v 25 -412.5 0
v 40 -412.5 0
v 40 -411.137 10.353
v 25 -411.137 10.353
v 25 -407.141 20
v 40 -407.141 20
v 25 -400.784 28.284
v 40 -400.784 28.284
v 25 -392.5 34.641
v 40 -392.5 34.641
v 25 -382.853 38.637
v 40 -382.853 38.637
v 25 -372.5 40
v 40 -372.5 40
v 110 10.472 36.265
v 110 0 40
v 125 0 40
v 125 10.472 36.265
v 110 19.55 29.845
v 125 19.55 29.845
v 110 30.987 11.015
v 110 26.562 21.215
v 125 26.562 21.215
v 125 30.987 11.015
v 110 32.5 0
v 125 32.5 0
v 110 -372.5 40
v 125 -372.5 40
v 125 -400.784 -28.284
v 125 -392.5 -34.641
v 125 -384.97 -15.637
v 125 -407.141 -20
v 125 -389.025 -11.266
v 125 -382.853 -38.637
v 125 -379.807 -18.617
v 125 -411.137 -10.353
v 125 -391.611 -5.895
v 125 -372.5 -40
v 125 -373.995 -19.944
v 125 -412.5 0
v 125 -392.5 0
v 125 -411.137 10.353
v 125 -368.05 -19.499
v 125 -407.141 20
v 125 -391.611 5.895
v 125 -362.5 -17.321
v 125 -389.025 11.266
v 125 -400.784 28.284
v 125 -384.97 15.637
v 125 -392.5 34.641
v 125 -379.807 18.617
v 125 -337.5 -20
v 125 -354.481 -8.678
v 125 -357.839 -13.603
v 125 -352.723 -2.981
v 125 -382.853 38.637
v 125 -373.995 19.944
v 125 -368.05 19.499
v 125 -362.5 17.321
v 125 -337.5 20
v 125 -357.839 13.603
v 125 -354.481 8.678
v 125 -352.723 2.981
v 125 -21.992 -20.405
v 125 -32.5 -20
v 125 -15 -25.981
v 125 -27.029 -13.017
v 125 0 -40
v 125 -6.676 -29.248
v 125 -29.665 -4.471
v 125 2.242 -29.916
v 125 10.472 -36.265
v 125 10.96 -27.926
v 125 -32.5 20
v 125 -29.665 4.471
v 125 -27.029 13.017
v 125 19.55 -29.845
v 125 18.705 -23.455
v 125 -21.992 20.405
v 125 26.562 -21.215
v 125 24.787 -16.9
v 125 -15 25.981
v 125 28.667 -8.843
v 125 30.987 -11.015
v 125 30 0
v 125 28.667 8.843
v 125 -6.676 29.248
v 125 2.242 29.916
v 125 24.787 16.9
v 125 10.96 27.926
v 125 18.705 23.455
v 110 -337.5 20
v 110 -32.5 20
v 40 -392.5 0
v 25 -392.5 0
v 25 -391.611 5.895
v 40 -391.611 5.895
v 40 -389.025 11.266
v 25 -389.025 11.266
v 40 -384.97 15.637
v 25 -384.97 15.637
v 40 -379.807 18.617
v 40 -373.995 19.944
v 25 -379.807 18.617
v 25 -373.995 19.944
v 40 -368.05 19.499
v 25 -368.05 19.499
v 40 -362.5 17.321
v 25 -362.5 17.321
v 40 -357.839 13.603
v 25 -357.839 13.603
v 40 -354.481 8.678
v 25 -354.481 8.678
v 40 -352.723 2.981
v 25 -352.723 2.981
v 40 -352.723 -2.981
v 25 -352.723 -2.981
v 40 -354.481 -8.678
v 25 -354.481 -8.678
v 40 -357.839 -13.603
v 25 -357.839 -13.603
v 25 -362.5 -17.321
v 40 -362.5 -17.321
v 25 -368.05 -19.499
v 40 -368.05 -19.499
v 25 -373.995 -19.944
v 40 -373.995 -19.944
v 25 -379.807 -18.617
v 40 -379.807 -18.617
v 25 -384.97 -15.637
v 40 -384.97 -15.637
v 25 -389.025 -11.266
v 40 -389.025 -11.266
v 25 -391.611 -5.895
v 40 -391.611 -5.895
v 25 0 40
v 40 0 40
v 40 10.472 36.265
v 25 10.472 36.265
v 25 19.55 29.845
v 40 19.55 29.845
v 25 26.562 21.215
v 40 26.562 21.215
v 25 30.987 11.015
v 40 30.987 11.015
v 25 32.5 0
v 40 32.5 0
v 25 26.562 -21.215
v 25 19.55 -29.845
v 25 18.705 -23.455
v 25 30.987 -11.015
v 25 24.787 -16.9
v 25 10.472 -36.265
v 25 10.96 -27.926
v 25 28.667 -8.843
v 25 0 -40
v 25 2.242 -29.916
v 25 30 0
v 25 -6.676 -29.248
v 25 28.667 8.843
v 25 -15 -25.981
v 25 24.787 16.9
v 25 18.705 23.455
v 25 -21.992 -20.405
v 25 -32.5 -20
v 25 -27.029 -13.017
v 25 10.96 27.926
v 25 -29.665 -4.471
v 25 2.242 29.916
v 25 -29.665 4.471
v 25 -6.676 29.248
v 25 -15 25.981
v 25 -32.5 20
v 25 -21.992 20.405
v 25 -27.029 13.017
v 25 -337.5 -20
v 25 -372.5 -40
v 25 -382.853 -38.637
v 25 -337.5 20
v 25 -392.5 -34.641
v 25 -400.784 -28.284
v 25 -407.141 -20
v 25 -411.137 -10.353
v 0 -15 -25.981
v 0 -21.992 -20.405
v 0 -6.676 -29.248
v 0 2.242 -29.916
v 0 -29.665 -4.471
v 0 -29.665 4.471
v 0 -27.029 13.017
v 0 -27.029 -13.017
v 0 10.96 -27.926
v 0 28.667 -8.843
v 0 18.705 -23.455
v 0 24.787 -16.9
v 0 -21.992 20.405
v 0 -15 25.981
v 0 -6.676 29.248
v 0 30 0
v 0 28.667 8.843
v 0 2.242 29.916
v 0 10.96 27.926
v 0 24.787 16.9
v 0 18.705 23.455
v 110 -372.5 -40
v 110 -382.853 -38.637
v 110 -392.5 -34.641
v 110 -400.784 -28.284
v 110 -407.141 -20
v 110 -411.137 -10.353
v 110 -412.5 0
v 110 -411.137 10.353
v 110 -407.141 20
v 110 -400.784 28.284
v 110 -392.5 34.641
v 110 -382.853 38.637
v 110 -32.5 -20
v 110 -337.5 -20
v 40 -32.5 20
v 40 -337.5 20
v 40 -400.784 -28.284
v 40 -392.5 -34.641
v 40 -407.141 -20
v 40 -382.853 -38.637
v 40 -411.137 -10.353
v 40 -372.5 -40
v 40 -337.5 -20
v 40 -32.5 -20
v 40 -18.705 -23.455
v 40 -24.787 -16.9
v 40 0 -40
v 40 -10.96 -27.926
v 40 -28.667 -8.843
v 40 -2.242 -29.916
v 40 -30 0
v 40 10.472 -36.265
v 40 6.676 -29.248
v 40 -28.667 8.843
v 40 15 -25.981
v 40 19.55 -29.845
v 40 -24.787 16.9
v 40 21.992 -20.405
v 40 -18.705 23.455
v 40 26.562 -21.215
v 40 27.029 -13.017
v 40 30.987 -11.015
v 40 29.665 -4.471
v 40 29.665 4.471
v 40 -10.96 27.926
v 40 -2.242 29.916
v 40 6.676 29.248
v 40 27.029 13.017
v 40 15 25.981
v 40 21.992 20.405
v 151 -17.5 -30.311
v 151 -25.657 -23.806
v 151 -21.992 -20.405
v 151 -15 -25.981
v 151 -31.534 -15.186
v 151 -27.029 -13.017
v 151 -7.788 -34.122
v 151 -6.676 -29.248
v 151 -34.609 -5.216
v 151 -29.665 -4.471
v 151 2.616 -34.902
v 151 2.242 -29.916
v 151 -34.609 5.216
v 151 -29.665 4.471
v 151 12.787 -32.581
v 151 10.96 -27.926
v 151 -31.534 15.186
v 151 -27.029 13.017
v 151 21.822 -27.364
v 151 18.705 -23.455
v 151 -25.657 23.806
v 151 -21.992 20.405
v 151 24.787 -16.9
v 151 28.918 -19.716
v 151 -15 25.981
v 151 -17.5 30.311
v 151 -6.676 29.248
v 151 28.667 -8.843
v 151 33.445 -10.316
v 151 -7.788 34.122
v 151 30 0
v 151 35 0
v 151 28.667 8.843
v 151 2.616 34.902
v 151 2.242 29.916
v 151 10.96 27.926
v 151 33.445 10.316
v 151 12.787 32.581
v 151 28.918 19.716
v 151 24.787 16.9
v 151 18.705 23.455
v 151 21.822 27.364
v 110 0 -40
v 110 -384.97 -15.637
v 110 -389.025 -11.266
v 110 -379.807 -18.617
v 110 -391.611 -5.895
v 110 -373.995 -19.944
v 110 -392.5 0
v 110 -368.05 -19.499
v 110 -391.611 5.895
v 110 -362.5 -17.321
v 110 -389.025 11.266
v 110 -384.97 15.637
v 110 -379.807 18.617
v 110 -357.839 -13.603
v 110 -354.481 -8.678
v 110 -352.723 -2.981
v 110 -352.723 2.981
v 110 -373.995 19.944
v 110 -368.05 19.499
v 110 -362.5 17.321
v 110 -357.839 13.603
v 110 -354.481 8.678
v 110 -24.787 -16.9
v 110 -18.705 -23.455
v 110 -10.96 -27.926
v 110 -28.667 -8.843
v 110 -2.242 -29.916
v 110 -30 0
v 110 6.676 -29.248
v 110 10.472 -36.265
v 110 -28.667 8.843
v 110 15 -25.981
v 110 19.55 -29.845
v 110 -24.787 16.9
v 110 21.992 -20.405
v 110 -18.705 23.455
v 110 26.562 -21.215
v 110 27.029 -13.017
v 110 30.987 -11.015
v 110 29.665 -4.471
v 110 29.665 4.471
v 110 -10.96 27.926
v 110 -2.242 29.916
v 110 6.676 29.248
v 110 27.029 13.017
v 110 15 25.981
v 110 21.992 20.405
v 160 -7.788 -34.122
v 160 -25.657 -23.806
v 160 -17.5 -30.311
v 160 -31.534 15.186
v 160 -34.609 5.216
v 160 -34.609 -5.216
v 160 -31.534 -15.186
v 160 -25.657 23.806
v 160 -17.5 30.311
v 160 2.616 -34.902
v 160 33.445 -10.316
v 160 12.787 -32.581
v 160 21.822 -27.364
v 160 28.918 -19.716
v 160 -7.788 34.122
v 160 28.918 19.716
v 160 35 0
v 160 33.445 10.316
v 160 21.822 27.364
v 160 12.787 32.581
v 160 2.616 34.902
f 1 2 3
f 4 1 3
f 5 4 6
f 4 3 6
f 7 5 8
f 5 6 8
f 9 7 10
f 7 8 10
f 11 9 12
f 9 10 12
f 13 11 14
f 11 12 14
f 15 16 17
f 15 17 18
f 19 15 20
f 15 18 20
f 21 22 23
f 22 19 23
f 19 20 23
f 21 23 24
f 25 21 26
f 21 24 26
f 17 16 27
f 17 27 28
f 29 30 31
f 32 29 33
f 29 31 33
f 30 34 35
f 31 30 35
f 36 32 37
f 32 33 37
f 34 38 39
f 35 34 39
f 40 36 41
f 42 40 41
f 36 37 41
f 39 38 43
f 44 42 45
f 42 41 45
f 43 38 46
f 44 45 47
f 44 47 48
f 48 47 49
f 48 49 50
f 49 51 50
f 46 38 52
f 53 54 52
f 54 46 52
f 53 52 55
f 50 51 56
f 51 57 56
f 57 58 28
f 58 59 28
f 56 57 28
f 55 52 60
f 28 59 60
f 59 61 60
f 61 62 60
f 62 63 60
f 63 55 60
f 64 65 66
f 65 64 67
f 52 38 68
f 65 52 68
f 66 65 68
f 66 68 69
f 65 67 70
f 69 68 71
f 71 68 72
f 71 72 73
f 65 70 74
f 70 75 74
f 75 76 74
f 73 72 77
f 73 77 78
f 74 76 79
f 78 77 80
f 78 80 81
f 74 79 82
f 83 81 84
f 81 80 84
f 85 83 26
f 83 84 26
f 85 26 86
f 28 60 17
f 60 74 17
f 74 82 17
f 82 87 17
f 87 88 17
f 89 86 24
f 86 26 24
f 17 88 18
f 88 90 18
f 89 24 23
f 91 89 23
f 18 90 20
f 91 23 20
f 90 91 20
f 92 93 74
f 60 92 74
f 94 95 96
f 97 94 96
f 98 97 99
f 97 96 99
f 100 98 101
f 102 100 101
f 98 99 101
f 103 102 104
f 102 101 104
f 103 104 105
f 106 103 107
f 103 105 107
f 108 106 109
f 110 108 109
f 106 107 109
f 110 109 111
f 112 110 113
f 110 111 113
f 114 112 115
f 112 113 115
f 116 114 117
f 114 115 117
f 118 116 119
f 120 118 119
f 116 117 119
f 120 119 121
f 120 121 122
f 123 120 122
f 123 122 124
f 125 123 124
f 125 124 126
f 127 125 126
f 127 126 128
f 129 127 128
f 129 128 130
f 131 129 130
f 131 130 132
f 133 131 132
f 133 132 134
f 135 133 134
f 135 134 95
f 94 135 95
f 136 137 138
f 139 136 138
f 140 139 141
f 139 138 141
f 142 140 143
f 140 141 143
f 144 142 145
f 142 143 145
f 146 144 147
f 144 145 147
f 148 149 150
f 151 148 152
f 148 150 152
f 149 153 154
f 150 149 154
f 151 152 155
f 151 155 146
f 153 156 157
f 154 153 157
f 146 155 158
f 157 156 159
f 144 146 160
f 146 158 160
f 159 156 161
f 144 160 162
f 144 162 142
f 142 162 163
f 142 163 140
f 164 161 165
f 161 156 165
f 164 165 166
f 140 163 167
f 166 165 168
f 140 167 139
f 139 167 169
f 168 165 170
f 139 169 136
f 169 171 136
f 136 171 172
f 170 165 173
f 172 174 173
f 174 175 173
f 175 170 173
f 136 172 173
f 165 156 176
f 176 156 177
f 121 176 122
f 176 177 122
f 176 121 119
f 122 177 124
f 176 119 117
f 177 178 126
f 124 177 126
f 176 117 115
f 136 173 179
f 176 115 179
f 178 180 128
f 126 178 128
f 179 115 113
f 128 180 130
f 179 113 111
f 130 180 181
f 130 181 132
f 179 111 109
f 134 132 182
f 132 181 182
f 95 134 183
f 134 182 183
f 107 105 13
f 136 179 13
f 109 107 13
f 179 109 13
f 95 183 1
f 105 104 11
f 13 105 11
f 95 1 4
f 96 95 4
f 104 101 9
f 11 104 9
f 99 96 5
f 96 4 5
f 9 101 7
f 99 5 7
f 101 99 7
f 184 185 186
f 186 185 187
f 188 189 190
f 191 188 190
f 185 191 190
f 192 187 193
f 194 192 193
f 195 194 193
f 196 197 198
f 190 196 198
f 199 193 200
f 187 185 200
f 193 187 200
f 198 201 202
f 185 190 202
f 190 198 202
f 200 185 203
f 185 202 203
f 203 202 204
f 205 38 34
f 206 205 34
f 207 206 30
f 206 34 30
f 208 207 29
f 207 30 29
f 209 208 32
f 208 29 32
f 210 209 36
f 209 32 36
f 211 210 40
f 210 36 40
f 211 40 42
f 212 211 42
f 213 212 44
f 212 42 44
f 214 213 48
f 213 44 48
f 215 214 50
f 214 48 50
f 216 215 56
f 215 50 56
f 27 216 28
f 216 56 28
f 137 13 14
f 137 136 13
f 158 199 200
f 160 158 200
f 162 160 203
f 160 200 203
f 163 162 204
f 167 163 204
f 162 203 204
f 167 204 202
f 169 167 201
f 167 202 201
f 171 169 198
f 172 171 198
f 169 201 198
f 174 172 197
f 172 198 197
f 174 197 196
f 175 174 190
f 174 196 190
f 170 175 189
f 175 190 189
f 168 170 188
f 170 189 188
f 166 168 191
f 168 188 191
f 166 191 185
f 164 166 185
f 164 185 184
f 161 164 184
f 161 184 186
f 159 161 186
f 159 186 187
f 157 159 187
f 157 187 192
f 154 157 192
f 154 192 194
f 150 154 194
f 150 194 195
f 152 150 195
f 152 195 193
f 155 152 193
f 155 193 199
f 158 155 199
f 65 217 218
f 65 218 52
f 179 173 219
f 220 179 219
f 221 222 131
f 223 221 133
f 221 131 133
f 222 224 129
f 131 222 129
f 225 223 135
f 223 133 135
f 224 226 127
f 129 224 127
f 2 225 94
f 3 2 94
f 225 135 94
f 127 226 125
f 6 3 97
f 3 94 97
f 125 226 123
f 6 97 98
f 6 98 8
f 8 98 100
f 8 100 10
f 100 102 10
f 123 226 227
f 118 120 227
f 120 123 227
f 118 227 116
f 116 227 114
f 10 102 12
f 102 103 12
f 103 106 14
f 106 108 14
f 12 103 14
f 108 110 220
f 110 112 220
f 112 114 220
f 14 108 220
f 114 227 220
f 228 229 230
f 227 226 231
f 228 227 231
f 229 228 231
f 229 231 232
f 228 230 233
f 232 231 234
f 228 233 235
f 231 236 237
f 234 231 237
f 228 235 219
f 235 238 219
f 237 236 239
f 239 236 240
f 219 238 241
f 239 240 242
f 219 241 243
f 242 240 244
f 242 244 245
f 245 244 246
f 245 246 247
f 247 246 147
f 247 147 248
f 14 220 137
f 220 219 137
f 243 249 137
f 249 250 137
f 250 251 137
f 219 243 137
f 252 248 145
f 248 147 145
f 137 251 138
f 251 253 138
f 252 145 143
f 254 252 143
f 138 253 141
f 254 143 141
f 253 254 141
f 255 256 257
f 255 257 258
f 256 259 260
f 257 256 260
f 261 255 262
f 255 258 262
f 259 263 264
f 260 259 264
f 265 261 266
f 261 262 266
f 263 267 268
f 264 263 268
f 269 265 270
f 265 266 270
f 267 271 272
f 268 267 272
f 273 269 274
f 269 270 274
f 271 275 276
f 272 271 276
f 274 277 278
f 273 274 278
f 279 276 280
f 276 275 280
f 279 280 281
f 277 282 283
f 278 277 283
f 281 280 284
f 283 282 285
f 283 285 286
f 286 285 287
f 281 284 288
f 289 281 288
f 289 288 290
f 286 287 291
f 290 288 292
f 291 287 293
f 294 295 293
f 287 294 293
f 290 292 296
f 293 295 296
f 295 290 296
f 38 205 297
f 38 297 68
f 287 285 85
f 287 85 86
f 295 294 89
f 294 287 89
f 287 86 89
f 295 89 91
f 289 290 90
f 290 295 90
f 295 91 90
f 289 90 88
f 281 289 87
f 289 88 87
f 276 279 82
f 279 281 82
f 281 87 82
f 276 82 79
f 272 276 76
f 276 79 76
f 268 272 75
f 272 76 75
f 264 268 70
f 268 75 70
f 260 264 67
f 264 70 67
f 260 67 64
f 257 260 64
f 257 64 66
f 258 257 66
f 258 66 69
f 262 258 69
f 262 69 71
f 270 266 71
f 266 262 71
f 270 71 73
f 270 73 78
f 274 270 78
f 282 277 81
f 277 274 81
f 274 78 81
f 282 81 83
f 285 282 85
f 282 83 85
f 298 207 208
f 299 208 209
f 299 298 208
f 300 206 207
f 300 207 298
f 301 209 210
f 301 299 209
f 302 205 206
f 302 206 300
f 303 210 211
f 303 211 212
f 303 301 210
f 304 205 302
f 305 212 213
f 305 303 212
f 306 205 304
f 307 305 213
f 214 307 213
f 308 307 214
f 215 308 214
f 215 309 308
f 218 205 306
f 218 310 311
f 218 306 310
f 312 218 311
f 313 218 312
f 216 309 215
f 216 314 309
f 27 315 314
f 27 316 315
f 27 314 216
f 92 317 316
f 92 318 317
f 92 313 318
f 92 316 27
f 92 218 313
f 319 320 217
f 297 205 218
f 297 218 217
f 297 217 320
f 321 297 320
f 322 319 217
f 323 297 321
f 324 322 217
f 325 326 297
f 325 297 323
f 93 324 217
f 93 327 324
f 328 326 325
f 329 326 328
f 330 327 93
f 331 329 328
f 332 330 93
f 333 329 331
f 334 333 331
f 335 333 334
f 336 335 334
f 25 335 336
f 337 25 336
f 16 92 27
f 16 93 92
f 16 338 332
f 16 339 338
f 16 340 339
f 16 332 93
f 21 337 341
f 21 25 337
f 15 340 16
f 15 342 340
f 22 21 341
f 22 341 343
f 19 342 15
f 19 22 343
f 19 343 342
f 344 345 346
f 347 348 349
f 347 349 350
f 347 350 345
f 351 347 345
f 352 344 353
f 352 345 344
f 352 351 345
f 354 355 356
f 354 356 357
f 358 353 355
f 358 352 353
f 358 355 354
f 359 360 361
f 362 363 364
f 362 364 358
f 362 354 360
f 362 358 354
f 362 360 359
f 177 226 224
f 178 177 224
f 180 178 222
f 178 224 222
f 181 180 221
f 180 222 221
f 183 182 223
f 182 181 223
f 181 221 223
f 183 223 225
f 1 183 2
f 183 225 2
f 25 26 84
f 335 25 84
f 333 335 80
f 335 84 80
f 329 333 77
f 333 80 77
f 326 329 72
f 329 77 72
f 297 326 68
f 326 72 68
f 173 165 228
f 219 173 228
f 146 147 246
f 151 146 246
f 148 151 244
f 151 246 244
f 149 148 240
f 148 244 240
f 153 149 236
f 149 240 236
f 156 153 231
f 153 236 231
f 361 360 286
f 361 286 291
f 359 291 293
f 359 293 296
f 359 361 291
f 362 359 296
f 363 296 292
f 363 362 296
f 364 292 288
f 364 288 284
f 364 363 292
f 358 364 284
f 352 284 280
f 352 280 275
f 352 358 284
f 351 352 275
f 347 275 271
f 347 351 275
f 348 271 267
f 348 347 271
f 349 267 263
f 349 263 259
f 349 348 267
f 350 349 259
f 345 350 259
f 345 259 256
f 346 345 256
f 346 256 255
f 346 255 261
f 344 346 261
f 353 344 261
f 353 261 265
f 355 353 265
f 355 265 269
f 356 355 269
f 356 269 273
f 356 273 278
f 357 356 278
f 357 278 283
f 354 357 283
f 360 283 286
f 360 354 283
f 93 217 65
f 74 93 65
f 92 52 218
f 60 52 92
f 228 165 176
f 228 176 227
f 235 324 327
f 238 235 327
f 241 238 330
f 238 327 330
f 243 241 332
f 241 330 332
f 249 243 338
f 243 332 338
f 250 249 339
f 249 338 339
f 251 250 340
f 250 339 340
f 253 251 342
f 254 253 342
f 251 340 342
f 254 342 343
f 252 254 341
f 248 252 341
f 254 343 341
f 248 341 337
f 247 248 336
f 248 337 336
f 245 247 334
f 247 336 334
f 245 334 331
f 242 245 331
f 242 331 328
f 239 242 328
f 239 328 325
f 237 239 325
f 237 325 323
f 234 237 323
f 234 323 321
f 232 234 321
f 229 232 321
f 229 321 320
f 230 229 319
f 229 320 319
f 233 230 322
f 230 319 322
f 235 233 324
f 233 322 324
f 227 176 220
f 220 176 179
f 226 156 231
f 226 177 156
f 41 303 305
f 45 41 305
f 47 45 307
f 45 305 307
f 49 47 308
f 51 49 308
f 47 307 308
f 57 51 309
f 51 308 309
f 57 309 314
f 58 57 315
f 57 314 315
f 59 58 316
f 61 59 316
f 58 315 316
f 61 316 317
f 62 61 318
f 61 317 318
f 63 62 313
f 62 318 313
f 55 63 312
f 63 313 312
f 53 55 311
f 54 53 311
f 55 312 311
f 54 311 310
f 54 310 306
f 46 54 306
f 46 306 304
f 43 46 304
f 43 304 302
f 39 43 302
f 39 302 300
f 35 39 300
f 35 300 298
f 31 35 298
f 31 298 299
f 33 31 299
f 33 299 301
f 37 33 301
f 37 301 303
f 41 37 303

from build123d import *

# Parameters (mm, degrees)
F0_R          = 30
F1_DEPTH      = 160
F2_W          = 100
F2_H          = 80
F3_DEPTH      = 32.5
F3_DEPTH_BACK = 32.5
F4_W          = 15
F4_H          = 20
F5_DEPTH      = 380
F6_W          = 75
F6_H          = 80
F7_DEPTH      = 15
F8_W          = 75
F8_H          = 80
F9_DEPTH      = 15
F10_R         = 20
F11_DEPTH     = 135.001
F13_DEPTH     = 125.001
F14_W         = 70
F14_H         = 80
F15_DEPTH     = 65.001
F17_DEPTH     = 125.001
F18_R         = 30
F19_DEPTH     = 70
F20_R         = 35
F21_DEPTH     = 9


with BuildPart() as f1:
    # F0 (on Right) → F1 (new body)
    with BuildSketch(Plane.YZ):
        Circle(F0_R)
    extrude(amount=F1_DEPTH)

    # F2 (on Front) → F3 (join, two sides)
    with BuildSketch(Plane.XZ) as f3_sk:
        with Locations((75, 0)):
            Rectangle(F2_W, F2_H)
    extrude(amount=F3_DEPTH)
    extrude(f3_sk.sketch, amount=-F3_DEPTH_BACK)

    # F4 (on face) → F5 (join)
    with BuildSketch(Plane.XZ.offset(32.5)):
        with Locations((117.5, 30)):
            Rectangle(F4_W, F4_H)
        with Locations((117.5, -30)):
            Rectangle(F4_W, F4_H)
        with Locations((32.5, 30)):
            Rectangle(F4_W, F4_H)
        with Locations((32.5, -30)):
            Rectangle(F4_W, F4_H)
    extrude(amount=F5_DEPTH)

    # F6 (on face) → F7 (join)
    with BuildSketch(Plane.YZ.offset(125)):
        with Locations((-375, 0)):
            Rectangle(F6_W, F6_H)
    extrude(amount=-F7_DEPTH)

    # F8 (on face) → F9 (join)
    with BuildSketch(Plane(origin=(25, 0, 0), x_dir=(0, -1, 0), z_dir=(-1, 0, 0))):
        with Locations((375, 0)):
            Rectangle(F8_W, F8_H)
    extrude(amount=-F9_DEPTH)

    # F10 (on face) → F11 (cut, through all)
    with BuildSketch(Plane(origin=(25, 0, 0), x_dir=(0, -1, 0), z_dir=(-1, 0, 0))):
        with Locations((372.5, 0)):
            Circle(F10_R)
    extrude(amount=-F11_DEPTH, mode=Mode.SUBTRACT)

    # F12 (on face) → F13 (cut, through all)
    with BuildSketch(Plane.YZ.offset(125)):
        with BuildLine():
            ThreePointArc((-372.5, -40), (-400.7842712969, -28.2842711981), (-412.5, 1.397e-07))
            Line((-412.5, 1.397e-07), (-412.5, -40))
            Line((-412.5, -40), (-372.5, -40))
        make_face()
        with BuildLine():
            ThreePointArc((-412.5, 1.397e-07), (-400.7842711981, 28.2842712969), (-372.5, 40))
            Line((-372.5, 40), (-412.5, 40))
            Line((-412.5, 40), (-412.5, 1.397e-07))
        make_face()
    extrude(amount=-F13_DEPTH, mode=Mode.SUBTRACT)

    # F14 (on face) → F15 (cut, through all)
    with BuildSketch(Plane.XZ.offset(32.5)):
        with Locations((75, 0)):
            Rectangle(F14_W, F14_H)
    extrude(amount=-F15_DEPTH, mode=Mode.SUBTRACT)

    # F16 (on face) → F17 (cut, through all)
    with BuildSketch(Plane.YZ.offset(125)):
        with BuildLine():
            ThreePointArc((0, 40), (23.3508126253, 25.7694100117), (32.5, -3.825e-07))
            Line((32.5, -3.825e-07), (32.5, 40))
            Line((32.5, 40), (0, 40))
        make_face()
        with BuildLine():
            ThreePointArc((32.5, -3.825e-07), (23.3508123842, -25.7694103085), (0, -40))
            Line((0, -40), (32.5, -40))
            Line((32.5, -40), (32.5, -3.825e-07))
        make_face()
    extrude(amount=-F17_DEPTH, mode=Mode.SUBTRACT)

    # F18 (on face) → F19 (join)
    with BuildSketch(Plane(origin=(110, 0, 0), x_dir=(0, -1, 0), z_dir=(-1, 0, 0))):
        Circle(F18_R)
    extrude(amount=F19_DEPTH)

    # F20 (on face) → F21 (join)
    with BuildSketch(Plane.YZ.offset(160)):
        Circle(F20_R)
    extrude(amount=-F21_DEPTH)


solid = f1.part
